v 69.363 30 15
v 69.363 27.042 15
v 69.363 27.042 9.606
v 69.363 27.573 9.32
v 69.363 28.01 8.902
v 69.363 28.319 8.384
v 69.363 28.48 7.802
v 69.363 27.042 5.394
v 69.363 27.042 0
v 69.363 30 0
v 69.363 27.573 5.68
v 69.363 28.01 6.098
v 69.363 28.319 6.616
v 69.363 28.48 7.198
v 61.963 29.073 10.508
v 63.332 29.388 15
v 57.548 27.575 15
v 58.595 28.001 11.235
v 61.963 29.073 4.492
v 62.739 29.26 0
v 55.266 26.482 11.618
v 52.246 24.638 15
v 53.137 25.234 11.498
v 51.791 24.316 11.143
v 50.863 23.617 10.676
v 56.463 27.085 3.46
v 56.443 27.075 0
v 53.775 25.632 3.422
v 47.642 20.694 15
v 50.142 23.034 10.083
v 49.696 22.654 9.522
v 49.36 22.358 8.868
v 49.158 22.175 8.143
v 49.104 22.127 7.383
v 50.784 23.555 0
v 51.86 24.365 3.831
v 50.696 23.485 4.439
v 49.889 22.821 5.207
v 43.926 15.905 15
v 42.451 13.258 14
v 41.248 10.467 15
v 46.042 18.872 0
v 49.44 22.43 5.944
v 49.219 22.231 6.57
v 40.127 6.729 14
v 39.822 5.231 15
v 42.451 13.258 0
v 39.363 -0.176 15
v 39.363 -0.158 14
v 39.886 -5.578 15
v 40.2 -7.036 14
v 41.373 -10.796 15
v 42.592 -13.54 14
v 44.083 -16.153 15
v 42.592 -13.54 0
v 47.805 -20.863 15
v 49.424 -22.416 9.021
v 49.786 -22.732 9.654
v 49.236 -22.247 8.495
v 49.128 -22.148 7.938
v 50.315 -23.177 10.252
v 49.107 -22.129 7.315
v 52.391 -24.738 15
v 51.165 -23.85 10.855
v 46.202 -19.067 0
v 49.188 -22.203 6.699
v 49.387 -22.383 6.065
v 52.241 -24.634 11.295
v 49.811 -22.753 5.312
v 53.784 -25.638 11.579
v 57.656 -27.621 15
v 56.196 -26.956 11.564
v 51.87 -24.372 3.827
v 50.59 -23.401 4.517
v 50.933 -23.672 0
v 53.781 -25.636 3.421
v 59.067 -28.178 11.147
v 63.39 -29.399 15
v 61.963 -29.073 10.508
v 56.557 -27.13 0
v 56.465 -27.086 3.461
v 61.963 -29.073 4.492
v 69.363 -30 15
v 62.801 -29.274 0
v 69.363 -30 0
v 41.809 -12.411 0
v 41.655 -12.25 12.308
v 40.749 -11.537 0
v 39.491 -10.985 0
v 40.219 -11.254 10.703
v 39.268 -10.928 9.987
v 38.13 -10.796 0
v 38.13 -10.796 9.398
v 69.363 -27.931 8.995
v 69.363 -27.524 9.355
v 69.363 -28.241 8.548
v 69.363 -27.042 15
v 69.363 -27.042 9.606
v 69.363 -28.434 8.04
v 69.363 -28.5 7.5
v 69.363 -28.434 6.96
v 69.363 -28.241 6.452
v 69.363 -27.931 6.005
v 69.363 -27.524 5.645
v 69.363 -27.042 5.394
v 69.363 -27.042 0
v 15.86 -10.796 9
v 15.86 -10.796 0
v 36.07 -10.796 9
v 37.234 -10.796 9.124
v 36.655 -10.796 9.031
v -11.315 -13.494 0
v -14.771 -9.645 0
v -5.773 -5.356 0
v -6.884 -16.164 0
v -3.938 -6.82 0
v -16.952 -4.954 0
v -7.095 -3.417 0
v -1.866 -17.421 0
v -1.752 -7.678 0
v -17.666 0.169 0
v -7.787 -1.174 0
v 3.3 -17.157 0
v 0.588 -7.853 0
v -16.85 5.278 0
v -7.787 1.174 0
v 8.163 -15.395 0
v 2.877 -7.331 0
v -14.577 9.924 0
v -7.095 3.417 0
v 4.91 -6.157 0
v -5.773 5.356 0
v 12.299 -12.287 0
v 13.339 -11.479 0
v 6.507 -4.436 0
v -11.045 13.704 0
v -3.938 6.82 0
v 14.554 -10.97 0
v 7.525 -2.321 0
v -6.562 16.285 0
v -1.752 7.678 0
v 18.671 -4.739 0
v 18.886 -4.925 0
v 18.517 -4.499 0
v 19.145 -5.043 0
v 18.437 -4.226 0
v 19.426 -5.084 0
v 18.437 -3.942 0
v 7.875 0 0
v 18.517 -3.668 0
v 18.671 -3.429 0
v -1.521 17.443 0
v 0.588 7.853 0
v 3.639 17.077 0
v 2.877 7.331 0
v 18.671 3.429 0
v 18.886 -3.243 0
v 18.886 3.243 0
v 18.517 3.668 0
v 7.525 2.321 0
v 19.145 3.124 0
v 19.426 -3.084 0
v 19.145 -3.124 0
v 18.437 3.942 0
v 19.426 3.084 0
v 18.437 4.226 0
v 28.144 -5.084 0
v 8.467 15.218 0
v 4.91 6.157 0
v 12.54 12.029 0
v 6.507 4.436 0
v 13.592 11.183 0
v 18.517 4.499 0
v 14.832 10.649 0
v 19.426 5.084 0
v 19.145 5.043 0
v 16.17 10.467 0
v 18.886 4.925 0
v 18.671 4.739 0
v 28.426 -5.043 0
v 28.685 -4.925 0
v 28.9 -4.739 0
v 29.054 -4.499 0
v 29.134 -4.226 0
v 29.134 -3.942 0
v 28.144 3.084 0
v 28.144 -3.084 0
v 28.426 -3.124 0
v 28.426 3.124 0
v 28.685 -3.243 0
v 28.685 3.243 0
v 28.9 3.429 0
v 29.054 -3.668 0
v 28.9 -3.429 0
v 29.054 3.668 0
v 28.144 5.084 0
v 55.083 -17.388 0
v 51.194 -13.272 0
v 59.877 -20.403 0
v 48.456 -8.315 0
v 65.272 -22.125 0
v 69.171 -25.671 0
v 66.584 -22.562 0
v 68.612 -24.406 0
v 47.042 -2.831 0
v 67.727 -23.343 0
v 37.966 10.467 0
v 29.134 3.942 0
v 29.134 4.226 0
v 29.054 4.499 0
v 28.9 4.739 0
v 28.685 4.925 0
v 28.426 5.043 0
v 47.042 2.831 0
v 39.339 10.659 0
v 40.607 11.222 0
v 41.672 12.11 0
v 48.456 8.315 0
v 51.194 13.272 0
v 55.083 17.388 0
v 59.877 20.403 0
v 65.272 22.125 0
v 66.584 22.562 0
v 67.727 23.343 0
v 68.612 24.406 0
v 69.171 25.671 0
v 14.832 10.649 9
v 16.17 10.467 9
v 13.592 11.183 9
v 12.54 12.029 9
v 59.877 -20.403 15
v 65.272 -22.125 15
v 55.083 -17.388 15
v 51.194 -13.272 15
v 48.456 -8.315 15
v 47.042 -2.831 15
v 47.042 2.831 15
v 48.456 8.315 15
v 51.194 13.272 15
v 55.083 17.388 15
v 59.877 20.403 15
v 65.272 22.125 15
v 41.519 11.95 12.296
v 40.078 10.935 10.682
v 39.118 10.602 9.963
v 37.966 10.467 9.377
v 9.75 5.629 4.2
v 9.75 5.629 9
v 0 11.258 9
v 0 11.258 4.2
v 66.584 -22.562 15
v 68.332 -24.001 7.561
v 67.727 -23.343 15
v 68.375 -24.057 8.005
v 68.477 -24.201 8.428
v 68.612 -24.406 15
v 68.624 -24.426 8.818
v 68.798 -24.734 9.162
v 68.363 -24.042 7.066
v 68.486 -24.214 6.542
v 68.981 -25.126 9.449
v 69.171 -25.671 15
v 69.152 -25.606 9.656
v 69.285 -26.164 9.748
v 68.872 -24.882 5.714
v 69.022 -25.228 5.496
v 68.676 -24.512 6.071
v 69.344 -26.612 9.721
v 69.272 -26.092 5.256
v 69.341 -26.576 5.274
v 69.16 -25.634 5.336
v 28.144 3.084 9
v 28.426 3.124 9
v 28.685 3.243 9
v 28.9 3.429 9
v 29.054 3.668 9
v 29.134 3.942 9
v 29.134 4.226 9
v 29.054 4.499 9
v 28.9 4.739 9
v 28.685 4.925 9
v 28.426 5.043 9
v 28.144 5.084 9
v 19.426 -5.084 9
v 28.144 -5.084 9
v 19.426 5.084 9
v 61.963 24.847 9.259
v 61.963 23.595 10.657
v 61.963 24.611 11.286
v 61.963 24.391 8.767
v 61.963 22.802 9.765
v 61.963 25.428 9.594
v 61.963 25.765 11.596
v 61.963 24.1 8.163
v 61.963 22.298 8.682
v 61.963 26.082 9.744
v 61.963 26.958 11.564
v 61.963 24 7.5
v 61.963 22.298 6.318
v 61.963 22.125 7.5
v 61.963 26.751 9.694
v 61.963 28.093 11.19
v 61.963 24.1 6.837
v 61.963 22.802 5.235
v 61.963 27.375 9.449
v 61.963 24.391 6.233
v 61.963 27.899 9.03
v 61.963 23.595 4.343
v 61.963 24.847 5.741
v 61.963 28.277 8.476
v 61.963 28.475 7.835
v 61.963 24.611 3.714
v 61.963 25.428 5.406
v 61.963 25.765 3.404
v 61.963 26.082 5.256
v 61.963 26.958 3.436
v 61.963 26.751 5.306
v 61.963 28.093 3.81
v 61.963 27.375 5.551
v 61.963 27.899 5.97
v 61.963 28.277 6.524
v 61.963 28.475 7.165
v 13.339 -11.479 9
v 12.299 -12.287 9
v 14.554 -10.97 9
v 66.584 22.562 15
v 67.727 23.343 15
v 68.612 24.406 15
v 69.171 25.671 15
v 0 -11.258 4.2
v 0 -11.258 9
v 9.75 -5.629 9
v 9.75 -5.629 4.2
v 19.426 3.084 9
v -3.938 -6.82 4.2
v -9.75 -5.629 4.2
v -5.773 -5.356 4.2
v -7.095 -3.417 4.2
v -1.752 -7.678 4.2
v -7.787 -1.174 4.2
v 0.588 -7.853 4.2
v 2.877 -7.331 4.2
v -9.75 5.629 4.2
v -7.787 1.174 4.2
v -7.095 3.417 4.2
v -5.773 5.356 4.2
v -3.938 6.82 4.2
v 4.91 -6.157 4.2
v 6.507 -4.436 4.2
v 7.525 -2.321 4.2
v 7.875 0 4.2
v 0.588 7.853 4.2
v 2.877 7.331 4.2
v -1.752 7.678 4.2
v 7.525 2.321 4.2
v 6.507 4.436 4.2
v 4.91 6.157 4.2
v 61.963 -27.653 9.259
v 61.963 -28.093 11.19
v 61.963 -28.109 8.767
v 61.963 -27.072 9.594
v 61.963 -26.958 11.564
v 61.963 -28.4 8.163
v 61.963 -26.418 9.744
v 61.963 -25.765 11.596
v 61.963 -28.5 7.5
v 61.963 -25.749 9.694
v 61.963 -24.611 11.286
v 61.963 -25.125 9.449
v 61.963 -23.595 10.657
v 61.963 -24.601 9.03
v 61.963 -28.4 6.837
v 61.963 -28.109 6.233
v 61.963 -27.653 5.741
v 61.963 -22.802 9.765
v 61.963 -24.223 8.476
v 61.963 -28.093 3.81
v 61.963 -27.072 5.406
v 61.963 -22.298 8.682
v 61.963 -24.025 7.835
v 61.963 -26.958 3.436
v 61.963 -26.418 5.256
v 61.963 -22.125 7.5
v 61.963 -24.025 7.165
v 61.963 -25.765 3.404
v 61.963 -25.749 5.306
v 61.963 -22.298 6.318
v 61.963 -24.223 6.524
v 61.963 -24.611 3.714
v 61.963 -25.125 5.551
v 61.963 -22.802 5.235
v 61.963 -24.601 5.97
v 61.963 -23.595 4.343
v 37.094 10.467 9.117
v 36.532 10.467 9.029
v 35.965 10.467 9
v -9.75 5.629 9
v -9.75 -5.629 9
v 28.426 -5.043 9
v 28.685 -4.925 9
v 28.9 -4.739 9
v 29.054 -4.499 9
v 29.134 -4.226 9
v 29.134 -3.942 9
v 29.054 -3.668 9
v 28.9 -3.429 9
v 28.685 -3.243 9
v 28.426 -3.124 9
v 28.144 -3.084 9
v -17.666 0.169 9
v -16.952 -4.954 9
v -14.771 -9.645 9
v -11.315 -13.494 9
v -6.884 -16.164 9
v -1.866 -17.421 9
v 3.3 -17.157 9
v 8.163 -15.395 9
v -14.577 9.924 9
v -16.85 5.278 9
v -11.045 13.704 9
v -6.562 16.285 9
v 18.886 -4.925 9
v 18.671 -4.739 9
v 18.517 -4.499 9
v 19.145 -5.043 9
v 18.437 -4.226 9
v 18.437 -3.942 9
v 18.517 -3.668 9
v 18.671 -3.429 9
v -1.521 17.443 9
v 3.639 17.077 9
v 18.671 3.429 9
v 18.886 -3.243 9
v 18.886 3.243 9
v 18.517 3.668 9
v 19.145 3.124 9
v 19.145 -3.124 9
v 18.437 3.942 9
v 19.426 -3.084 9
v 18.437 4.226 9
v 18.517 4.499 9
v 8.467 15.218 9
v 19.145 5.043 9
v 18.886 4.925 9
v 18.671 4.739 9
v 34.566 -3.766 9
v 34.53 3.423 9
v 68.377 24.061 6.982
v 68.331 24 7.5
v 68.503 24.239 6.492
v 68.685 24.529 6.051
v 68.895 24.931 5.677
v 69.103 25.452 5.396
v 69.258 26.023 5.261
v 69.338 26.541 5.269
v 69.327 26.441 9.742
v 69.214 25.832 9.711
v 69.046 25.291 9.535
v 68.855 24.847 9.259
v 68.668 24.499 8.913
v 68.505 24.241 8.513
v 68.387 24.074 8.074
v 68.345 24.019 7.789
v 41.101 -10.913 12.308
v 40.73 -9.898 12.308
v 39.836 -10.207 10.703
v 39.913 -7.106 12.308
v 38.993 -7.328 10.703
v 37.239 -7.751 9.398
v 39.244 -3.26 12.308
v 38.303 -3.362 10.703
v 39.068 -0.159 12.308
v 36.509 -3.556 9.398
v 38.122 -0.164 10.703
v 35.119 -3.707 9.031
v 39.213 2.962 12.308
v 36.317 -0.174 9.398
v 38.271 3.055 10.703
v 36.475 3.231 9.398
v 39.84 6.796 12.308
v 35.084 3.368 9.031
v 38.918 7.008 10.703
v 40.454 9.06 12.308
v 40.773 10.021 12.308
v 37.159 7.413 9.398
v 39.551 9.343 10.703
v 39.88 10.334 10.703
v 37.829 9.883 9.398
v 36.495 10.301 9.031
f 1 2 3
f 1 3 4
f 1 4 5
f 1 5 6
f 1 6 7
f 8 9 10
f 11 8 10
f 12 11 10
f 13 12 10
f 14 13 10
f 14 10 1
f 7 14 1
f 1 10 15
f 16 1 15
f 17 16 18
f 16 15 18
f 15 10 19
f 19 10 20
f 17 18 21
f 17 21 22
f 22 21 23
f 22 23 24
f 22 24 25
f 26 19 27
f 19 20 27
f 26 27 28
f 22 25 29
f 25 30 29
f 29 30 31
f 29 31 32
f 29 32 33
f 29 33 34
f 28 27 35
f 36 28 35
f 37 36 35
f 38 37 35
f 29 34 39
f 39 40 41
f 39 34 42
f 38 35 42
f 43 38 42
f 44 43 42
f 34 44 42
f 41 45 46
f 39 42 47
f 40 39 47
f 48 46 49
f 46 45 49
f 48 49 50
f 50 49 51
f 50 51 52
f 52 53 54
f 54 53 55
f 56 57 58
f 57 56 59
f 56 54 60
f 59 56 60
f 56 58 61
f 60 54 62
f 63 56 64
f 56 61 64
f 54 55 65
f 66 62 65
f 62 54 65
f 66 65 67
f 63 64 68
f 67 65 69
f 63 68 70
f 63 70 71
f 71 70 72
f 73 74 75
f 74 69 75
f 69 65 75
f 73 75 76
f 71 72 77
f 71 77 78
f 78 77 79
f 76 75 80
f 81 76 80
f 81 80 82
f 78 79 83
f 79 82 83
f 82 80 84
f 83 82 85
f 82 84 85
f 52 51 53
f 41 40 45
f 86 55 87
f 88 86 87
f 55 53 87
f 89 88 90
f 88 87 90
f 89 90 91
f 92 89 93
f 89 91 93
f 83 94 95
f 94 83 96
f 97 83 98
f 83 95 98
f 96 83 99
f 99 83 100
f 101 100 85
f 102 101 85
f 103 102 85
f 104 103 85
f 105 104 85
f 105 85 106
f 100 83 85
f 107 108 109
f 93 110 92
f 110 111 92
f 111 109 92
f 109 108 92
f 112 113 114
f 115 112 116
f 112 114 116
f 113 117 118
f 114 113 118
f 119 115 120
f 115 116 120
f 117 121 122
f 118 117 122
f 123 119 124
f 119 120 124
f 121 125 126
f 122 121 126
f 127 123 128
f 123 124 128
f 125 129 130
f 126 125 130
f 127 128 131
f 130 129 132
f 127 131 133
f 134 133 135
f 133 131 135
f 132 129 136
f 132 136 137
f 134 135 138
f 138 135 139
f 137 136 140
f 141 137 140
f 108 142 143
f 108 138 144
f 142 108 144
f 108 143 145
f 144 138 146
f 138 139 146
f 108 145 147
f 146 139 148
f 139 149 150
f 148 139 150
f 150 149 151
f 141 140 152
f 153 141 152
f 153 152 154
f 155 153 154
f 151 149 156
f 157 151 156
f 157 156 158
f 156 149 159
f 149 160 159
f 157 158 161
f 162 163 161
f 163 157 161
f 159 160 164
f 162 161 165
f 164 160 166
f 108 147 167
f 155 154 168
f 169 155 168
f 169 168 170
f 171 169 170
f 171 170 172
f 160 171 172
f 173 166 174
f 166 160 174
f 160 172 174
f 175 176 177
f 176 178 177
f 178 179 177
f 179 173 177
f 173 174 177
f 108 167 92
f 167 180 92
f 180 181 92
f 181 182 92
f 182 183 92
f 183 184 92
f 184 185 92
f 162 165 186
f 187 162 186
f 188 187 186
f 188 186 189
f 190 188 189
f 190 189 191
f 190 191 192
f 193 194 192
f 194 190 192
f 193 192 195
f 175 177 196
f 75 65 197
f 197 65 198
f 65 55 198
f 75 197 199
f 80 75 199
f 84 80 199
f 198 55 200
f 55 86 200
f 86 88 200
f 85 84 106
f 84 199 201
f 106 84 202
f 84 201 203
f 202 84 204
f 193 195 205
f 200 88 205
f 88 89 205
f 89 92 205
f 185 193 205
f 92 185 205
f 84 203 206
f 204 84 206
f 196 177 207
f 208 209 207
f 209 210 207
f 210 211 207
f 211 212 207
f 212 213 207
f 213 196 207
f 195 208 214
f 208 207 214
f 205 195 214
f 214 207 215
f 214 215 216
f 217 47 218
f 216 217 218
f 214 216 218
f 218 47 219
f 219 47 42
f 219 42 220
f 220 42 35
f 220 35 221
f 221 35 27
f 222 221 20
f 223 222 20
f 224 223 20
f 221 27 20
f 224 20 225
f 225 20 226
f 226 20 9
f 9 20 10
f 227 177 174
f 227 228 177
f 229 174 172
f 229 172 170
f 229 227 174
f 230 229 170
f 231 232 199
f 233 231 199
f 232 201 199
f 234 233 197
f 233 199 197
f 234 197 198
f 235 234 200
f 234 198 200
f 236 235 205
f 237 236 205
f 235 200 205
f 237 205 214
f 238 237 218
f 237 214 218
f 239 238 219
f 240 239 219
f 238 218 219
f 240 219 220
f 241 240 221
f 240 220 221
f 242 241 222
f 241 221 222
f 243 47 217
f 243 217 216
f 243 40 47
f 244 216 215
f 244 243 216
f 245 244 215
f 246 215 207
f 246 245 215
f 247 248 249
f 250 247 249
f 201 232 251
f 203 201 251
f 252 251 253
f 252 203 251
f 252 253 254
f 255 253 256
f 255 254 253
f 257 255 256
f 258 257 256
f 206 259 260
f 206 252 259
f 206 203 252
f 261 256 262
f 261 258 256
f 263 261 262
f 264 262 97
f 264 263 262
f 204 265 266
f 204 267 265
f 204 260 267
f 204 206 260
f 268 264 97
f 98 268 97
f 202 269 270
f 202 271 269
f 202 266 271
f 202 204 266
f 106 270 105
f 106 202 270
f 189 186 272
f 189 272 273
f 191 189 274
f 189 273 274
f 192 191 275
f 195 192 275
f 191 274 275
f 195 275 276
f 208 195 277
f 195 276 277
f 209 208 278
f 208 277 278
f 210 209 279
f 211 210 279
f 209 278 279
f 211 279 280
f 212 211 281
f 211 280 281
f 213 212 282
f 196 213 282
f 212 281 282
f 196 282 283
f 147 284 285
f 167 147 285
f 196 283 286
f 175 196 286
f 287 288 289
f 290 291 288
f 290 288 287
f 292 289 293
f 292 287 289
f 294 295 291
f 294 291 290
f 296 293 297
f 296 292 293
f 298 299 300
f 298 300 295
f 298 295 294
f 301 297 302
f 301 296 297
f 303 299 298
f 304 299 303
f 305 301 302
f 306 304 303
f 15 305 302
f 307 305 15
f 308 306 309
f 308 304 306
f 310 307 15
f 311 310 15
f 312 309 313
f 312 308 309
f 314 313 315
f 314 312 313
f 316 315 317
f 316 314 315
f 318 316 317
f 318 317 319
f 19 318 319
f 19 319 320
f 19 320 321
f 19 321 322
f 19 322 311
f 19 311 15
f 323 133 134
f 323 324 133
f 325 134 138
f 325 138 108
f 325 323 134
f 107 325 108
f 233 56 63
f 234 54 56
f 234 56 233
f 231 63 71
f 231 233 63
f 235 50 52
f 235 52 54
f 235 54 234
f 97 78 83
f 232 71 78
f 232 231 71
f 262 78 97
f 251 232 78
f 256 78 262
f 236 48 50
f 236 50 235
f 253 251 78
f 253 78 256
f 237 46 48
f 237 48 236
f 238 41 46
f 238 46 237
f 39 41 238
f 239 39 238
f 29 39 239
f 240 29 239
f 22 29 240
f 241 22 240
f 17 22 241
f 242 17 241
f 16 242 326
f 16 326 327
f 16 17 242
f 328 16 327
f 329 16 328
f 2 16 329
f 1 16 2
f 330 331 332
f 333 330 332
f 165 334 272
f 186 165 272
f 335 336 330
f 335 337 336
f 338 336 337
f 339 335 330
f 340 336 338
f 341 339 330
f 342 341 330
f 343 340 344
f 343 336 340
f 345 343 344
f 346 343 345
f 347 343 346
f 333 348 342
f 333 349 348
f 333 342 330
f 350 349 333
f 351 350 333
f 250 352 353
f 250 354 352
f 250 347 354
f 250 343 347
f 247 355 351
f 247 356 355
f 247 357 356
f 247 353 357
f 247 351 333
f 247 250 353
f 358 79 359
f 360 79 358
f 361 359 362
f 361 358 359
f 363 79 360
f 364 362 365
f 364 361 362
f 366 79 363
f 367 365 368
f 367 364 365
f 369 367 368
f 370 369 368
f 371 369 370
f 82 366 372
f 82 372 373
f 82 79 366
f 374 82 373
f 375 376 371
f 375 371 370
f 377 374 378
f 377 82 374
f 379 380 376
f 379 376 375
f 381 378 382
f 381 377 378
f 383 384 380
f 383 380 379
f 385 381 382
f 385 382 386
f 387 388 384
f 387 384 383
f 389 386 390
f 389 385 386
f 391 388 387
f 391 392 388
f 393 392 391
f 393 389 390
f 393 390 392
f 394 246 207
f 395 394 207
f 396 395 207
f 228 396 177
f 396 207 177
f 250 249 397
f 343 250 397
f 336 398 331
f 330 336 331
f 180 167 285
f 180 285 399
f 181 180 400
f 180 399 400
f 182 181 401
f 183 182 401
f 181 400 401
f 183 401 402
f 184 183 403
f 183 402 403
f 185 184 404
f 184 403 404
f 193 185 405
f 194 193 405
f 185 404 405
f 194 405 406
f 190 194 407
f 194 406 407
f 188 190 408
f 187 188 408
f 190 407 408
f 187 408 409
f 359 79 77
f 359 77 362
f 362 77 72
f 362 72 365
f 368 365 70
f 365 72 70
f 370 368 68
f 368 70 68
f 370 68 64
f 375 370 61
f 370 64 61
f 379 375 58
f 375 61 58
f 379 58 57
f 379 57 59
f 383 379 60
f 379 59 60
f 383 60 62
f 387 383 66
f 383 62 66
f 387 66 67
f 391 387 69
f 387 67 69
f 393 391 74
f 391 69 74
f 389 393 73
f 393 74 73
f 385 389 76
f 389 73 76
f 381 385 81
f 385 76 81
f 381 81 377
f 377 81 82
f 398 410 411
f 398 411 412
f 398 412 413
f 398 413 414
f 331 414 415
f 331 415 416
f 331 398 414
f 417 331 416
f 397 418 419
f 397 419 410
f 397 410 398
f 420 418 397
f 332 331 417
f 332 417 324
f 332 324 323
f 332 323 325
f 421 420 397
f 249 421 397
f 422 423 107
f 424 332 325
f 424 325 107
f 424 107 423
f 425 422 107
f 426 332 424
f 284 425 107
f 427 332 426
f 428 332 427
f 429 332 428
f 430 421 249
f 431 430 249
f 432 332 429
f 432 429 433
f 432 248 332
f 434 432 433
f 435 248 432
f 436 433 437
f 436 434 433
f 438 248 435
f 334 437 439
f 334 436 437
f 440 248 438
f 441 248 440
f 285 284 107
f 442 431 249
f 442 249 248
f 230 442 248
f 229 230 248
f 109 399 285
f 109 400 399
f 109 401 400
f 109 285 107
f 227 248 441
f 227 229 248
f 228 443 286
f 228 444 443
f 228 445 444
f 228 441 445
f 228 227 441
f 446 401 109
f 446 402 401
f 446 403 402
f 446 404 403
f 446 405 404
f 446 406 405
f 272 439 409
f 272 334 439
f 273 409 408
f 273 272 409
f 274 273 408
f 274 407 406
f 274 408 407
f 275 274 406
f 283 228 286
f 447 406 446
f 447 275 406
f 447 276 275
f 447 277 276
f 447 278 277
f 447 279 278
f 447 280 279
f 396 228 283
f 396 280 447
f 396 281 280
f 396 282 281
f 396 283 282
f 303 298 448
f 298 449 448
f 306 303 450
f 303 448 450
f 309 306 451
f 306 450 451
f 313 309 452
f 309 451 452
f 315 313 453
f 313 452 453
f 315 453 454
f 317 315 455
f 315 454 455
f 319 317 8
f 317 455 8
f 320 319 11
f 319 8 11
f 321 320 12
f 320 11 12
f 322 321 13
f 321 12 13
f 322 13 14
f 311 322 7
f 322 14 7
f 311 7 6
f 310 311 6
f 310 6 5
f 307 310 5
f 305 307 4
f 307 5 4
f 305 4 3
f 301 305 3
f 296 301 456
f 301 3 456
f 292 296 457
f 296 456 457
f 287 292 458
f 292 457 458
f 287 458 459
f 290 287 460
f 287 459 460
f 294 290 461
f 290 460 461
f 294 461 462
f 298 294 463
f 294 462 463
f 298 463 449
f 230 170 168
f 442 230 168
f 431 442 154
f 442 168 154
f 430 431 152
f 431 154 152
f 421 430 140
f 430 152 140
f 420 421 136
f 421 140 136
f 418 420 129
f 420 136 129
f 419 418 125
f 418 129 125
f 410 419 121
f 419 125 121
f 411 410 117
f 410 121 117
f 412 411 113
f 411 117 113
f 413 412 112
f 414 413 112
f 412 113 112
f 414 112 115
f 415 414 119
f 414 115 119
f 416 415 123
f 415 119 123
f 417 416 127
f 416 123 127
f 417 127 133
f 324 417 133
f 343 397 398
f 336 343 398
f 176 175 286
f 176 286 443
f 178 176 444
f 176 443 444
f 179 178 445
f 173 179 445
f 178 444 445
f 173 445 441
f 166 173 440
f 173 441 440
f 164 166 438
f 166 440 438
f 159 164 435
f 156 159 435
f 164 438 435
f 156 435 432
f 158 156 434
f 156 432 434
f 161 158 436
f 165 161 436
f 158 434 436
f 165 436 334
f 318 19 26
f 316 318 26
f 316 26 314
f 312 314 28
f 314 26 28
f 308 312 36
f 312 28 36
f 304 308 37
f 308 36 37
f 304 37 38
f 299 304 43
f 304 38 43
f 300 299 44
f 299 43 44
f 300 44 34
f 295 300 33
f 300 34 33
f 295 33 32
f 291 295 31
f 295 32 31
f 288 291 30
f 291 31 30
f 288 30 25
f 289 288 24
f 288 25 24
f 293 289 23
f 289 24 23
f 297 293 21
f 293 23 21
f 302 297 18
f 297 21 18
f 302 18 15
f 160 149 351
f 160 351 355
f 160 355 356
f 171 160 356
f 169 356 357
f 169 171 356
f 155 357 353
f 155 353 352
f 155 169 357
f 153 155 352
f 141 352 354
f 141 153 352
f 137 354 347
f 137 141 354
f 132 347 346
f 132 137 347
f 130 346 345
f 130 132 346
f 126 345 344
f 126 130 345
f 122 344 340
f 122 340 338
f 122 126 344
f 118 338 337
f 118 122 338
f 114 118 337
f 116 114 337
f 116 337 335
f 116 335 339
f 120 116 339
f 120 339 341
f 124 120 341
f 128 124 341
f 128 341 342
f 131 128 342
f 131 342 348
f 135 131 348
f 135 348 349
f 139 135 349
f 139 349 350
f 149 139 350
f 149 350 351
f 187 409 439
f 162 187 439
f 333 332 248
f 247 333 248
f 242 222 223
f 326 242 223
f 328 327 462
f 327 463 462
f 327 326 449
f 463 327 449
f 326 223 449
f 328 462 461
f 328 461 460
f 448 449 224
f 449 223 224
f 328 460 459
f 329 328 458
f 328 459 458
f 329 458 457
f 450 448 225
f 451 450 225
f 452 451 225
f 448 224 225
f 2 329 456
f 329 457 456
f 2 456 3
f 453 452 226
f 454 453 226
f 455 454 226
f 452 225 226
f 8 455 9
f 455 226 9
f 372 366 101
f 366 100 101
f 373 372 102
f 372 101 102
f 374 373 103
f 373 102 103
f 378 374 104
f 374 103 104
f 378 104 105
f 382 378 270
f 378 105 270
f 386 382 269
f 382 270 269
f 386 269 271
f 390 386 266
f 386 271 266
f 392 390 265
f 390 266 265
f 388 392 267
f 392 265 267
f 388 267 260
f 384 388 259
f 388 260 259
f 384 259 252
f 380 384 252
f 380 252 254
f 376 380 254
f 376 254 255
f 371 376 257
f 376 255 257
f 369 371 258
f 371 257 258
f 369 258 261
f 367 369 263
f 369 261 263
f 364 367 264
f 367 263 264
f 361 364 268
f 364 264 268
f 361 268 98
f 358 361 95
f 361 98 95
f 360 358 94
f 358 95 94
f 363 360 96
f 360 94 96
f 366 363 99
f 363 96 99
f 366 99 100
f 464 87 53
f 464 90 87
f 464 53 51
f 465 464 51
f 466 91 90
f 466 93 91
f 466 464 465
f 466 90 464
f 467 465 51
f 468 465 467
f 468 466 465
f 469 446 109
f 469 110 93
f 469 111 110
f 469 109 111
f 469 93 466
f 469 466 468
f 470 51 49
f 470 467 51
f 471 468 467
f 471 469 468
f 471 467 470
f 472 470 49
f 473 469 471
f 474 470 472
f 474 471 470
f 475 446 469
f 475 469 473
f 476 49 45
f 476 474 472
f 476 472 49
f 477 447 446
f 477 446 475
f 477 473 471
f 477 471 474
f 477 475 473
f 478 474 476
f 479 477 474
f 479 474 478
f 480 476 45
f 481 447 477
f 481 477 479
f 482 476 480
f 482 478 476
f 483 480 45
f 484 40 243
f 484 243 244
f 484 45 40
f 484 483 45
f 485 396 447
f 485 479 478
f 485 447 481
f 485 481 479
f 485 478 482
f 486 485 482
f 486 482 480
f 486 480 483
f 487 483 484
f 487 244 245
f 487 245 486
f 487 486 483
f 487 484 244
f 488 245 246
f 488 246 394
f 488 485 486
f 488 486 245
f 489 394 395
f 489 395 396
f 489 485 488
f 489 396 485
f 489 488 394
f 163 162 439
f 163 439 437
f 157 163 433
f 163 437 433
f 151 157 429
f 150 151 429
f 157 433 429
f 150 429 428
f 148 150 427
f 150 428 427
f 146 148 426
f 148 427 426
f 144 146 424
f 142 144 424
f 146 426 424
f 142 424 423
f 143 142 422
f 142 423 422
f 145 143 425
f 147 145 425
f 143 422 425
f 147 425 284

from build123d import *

# Parameters (mm, degrees)
F0_R           = 7.875
F1_DEPTH       = 9
F2_R           = 7.875
F3_DEPTH       = 4.8
F4_DEPTH       = 15
F5_R           = 5
F8_D           = 4.5
F8_DEPTH       = 25
F8_CBORE_D     = 8.25
F8_CBORE_DEPTH = 17
F8_TIP         = 1.3519363928
F11_DEPTH      = 25


# Not quite as in the source:
# - two fillets or chamfers of one size are made in one step


with BuildPart() as f1:
    # F0 (on Top) → F1 (new body)
    with BuildSketch(Plane.XY):
        with BuildLine():
            ThreePointArc((13.8549873727, 10.4671236312), (-17.6653132634, 0.1978340536), (13.609496128, -10.7964352789))
            Line((13.609496128, -10.7964352789), (41.3727938251, -10.7964352789))
            ThreePointArc((41.3727938251, -10.7964352789), (39.3632549532, -0.1760847087), (41.2479854227, 10.4671236312))
            Line((41.2479854227, 10.4671236312), (13.8549873727, 10.4671236312))
        make_face()
        Circle(F0_R, mode=Mode.SUBTRACT)
        with BuildLine():
            ThreePointArc((41.2479854227, 10.4671236312), (39.3632549532, -0.1760847087), (41.3727938251, -10.7964352789))
            ThreePointArc((41.3727938251, -10.7964352789), (52.3906001106, -24.7375530153), (69.362738185, -30))
            Line((69.362738185, -30), (69.362738185, -22.5))
            ThreePointArc((69.362738185, -22.5), (46.862738185, 0), (69.362738185, 22.5))
            Line((69.362738185, 22.5), (69.362738185, 30))
            ThreePointArc((69.362738185, 30), (52.2456956387, 24.6375090963), (41.2479854227, 10.4671236312))
        make_face()
    extrude(amount=F1_DEPTH)

    # F2 (on face) → F3 (cut)
    with BuildSketch(Plane.XY.offset(9)):
        Polygon((9.75, -5.6291651246), (9.75, 5.6291651246), (0, 11.2583302492), (-9.75, 5.6291651246), (-9.75, -5.6291651246), (0, -11.2583302492), align=None)
        Circle(F2_R, mode=Mode.SUBTRACT)
    extrude(amount=-F3_DEPTH, mode=Mode.SUBTRACT)

    # F0 (on Top) → F4 (join)
    with BuildSketch(Plane.XY):
        with BuildLine():
            ThreePointArc((41.2479854227, 10.4671236312), (39.3632549532, -0.1760847087), (41.3727938251, -10.7964352789))
            ThreePointArc((41.3727938251, -10.7964352789), (52.3906001106, -24.7375530153), (69.362738185, -30))
            Line((69.362738185, -30), (69.362738185, -22.5))
            ThreePointArc((69.362738185, -22.5), (46.862738185, 0), (69.362738185, 22.5))
            Line((69.362738185, 22.5), (69.362738185, 30))
            ThreePointArc((69.362738185, 30), (52.2456956387, 24.6375090963), (41.2479854227, 10.4671236312))
        make_face()
    extrude(amount=F4_DEPTH)

    # F5
    f5_edges = [f1.edges().sort_by_distance(p)[0] for p in [
        (13.609496, -10.796435, 4.5),
        (41.247985, 10.467124, 4.5),
        (41.372794, -10.796435, 4.5),
        (39.363255, -0.176085, 9),
        (13.854987, 10.467124, 4.5),
        (69.362738, -22.5, 7.5),
        (69.362738, 22.5, 7.5),
    ]]
    fillet(f5_edges, radius=F5_R)

    # F8
    with Locations(Plane(origin=(44.962738185, 0, 0), x_dir=(0, 1, 0), z_dir=(-1, 0, 0))):
        with Locations((26.25, -7.5), (-26.25, -7.5)):
            CounterBoreHole(F8_D / 2, F8_CBORE_D / 2, F8_CBORE_DEPTH, depth=F8_DEPTH)
            with Locations((0, 0, -(F8_DEPTH + F8_TIP / 2))):  # 118° drill point
                Cone(0, F8_D / 2, F8_TIP, mode=Mode.SUBTRACT)

    # F10 (on face) → F11 (cut)
    with BuildSketch(Plane.XY.offset(9)):
        with BuildLine():
            ThreePointArc((19.4264538586, 5.0838164277), (18.4264538586, 4.0838164277), (19.4264538586, 3.0838164277))
            Line((19.4264538586, 3.0838164277), (28.1441677362, 3.0838164277))
            ThreePointArc((28.1441677362, 3.0838164277), (29.1441677362, 4.0838164277), (28.1441677362, 5.0838164277))
            Line((28.1441677362, 5.0838164277), (19.4264538586, 5.0838164277))
        make_face()
        with BuildLine():
            Line((28.1441677362, -3.0838164277), (19.4264538586, -3.0838164277))
            ThreePointArc((19.4264538586, -3.0838164277), (18.4264538586, -4.0838164277), (19.4264538586, -5.0838164277))
            Line((19.4264538586, -5.0838164277), (28.1441677362, -5.0838164277))
            ThreePointArc((28.1441677362, -5.0838164277), (29.1441677362, -4.0838164277), (28.1441677362, -3.0838164277))
        make_face()
    extrude(amount=-F11_DEPTH, mode=Mode.SUBTRACT)


solid = f1.part
